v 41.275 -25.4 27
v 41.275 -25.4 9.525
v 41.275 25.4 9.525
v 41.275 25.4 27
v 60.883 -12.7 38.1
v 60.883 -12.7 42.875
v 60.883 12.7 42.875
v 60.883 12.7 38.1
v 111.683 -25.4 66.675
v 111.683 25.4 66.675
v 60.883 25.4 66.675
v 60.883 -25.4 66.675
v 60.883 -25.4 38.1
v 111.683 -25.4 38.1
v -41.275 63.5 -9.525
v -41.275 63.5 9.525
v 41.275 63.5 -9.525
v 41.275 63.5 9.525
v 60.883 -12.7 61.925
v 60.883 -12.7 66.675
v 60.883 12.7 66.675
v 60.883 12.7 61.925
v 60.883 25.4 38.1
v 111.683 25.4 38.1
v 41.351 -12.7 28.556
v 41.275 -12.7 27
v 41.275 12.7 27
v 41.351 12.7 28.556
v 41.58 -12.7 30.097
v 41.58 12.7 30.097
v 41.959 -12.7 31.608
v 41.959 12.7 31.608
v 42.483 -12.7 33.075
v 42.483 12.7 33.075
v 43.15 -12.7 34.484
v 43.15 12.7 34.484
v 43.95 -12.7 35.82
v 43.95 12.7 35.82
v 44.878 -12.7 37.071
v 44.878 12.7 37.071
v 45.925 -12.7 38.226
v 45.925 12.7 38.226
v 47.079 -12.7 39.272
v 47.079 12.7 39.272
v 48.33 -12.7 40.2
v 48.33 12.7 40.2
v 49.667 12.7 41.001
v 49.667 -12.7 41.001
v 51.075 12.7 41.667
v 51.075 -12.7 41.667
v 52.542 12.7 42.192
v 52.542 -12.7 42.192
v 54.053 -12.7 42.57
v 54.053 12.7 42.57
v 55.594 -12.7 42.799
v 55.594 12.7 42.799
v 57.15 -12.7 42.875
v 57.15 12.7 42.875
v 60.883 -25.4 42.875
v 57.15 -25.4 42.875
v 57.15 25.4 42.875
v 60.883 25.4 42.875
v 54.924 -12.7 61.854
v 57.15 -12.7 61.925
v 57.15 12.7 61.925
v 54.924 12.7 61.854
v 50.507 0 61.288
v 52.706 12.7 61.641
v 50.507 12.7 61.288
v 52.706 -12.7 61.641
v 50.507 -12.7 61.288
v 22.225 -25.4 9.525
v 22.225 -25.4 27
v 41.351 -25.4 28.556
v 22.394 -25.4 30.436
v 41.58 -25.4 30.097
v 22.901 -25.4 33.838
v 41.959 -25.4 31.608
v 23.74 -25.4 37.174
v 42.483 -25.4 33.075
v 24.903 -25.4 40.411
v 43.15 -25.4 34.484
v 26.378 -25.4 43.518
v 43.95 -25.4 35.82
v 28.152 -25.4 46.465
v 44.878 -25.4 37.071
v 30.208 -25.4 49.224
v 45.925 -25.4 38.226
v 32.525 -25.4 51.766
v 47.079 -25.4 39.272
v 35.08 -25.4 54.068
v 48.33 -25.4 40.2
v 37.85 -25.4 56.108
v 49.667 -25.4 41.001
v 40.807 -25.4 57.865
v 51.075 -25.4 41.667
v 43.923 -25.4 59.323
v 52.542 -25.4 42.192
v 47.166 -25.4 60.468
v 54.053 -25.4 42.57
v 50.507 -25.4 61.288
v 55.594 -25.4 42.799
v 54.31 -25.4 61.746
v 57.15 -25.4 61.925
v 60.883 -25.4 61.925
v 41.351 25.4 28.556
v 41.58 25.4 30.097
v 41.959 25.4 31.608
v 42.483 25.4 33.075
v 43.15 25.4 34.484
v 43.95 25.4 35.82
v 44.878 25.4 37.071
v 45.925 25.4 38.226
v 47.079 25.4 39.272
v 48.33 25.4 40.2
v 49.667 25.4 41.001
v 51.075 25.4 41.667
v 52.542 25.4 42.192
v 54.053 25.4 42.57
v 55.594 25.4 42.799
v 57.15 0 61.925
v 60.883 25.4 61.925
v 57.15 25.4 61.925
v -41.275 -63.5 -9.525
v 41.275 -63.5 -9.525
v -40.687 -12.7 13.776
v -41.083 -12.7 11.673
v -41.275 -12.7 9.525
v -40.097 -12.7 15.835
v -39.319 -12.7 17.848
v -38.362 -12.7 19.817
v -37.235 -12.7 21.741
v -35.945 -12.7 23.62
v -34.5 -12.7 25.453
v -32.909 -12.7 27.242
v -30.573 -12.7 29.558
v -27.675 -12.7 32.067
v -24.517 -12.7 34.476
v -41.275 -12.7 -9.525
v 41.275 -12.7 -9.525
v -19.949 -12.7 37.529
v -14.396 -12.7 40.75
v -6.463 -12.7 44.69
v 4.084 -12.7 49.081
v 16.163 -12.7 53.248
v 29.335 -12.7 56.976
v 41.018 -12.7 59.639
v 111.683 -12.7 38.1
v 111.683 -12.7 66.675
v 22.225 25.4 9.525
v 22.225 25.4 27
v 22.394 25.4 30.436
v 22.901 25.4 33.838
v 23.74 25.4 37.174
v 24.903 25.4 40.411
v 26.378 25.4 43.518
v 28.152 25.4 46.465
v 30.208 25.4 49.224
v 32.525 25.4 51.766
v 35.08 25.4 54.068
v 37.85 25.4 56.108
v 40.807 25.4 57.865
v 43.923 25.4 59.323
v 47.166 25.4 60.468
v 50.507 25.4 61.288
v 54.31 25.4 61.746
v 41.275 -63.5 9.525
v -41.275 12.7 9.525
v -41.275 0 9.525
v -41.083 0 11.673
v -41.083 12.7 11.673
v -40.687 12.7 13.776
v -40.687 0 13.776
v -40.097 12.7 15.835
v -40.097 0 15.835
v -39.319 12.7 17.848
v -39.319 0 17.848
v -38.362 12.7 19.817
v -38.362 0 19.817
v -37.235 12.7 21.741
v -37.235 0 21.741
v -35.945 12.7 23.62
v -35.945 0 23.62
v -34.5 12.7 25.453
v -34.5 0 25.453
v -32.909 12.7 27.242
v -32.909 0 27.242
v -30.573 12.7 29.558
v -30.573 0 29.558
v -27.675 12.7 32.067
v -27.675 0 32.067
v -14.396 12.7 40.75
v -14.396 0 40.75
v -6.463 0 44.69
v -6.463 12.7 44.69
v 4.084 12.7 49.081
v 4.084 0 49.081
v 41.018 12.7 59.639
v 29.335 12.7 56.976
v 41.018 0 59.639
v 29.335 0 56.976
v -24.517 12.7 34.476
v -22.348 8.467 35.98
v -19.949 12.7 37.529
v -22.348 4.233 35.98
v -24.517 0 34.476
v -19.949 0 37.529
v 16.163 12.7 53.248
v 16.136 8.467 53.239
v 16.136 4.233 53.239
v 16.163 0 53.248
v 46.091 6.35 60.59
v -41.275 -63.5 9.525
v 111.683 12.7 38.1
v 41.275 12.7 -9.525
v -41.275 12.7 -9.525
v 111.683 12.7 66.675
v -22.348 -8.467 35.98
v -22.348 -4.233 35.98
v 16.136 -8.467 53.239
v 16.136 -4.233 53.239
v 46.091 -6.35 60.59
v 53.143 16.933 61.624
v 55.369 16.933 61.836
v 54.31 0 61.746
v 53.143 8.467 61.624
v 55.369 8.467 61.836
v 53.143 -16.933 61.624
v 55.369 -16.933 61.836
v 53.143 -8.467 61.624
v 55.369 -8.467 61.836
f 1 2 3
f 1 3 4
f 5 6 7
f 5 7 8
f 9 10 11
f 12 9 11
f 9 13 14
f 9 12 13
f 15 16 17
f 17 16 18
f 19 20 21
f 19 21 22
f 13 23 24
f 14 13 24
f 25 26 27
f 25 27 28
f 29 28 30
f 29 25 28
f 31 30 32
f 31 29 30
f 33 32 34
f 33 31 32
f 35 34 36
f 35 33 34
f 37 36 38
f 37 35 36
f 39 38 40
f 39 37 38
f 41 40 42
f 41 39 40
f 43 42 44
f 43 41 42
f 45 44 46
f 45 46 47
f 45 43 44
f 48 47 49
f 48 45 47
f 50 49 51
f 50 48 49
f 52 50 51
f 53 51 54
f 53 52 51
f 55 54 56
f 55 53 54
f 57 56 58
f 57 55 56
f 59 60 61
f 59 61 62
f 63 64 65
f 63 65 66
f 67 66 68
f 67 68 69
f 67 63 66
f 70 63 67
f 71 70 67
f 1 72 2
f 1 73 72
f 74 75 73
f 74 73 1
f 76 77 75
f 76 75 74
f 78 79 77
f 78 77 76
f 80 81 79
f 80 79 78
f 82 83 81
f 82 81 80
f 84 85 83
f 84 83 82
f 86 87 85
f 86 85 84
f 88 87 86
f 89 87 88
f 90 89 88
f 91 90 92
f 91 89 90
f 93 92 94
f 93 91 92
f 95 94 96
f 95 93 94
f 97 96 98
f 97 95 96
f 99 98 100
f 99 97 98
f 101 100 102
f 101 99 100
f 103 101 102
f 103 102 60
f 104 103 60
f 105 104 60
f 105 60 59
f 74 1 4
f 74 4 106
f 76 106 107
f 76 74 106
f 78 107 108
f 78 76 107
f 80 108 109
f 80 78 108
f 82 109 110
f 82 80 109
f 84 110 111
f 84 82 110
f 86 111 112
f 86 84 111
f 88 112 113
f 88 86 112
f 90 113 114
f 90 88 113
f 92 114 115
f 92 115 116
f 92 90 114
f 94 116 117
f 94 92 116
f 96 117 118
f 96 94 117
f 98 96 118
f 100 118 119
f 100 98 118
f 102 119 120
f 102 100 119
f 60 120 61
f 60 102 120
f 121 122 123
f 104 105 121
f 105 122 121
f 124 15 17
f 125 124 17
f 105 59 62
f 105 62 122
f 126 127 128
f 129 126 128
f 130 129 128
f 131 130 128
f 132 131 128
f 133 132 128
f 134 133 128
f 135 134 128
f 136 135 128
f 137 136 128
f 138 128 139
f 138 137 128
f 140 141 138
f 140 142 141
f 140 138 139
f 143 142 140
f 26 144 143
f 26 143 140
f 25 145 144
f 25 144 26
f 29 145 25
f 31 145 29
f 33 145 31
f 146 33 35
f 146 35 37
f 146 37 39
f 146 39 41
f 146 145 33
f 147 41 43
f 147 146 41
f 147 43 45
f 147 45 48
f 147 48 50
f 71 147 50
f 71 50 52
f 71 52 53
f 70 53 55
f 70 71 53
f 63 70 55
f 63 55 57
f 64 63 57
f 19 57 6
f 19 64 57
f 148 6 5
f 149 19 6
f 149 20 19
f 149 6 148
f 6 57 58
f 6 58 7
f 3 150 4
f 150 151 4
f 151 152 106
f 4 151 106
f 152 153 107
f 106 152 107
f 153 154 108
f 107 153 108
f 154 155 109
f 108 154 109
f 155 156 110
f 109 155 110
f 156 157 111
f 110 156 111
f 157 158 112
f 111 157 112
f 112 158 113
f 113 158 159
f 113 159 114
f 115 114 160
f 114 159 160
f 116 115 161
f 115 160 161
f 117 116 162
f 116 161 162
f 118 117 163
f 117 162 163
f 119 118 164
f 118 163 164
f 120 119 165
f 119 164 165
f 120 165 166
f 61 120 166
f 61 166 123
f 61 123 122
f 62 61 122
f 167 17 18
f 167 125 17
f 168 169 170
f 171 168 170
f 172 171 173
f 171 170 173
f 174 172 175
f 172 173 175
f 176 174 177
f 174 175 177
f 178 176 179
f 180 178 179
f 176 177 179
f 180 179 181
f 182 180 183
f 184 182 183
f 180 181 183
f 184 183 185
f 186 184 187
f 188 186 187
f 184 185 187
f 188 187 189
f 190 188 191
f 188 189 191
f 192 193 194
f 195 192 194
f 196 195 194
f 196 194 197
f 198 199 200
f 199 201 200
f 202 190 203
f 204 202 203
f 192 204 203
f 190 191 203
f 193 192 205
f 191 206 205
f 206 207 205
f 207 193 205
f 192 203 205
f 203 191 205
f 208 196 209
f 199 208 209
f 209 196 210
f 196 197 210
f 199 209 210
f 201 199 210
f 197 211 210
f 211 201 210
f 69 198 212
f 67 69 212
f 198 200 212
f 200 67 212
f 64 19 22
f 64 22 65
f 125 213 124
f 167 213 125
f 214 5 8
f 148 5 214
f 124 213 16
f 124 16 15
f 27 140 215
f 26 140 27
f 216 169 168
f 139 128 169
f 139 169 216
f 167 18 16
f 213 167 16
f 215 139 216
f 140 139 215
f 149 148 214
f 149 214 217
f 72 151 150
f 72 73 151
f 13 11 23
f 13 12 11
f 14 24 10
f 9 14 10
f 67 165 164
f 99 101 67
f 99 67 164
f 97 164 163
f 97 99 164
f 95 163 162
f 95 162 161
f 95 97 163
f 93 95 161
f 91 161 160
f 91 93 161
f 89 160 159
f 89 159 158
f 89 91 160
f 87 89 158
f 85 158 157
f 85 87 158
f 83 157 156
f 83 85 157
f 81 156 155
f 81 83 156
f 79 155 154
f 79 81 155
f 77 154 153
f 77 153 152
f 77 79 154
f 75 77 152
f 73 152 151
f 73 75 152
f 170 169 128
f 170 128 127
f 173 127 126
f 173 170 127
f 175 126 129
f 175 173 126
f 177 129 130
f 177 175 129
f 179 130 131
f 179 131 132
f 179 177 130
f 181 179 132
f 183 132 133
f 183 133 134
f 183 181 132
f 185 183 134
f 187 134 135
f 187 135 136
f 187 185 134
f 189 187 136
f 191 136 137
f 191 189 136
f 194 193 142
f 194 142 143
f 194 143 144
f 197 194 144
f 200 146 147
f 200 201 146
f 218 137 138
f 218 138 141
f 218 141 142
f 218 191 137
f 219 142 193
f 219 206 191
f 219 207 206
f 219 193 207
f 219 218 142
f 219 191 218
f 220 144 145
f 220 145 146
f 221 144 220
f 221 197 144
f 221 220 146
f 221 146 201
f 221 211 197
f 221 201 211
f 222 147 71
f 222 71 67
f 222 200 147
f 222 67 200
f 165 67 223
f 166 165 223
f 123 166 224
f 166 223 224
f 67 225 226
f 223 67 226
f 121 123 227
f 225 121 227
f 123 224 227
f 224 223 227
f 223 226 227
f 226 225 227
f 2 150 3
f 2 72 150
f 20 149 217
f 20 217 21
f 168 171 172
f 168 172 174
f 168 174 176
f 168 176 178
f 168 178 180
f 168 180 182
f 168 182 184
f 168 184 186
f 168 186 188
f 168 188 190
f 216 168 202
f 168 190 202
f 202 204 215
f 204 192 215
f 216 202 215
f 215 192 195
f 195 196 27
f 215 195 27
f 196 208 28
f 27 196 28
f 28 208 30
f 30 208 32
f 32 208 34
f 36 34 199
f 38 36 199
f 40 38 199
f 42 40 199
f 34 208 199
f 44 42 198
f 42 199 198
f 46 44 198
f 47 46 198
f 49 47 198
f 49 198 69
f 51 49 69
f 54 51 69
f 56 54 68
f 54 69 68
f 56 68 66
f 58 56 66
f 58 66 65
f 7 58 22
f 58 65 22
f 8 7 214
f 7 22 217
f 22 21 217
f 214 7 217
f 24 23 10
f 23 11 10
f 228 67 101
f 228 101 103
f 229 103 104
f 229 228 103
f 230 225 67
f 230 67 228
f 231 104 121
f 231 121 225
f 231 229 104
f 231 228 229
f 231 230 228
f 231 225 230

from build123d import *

# Parameters (mm, degrees)
F1_DEPTH = 63.5
F2_DEPTH = 25.4
F3_DEPTH = 12.7
F4_DEPTH = 25.4


with BuildPart() as f1:
    # F0 (on Front) → F1 (new body, symmetric)
    with BuildSketch(Plane.XZ):
        Polygon((41.275, -9.525), (41.275, 9.525), (22.225, 9.525), (-41.275, 9.525), (-41.275, -9.525), align=None)
    extrude(amount=F1_DEPTH, both=True)


with BuildPart() as f2:
    # F0 (on Front) → F2 (new body, symmetric)
    with BuildSketch(Plane.XZ):
        Polygon((60.883363, 61.9252), (60.883363, 42.8752), (60.883363, 38.1), (111.683363, 38.1), (111.683363, 66.675), (60.883363, 66.675), align=None)
    extrude(amount=F2_DEPTH, both=True)


with BuildPart() as f3:
    # F0 (on Front) → F3 (new body, symmetric)
    with BuildSketch(Plane.XZ):
        Polygon((41.275, -9.525), (41.275, 9.525), (22.225, 9.525), (-41.275, 9.525), (-41.275, -9.525), align=None)
        with BuildLine():
            Line((22.225, 9.525), (41.275, 9.525))
            Line((41.275, 9.525), (41.275, 27.0002))
            ThreePointArc((41.275, 27.0002), (45.92468, 38.22552), (57.15, 42.8752))
            Line((57.15, 42.8752), (60.883363, 42.8752))
            Line((60.883363, 42.8752), (60.883363, 61.9252))
            Line((60.883363, 61.9252), (57.15, 61.9252))
            add(Edge.make_bspline(
                [(50.507101, 61.287625), (53.335145, 61.685698), (55.604551, 61.898257), (57.15, 61.9252)],
                knots=[99.933925, 99.933925, 99.933925, 99.933925, 111.504536, 111.504536, 111.504536, 111.504536], degree=3))
            ThreePointArc((50.507101, 61.287625), (30.20785, 49.223525), (22.225, 27.0002))
            Line((22.225, 27.0002), (22.225, 9.525))
        make_face()
        with BuildLine():
            Line((-41.275, 9.525), (22.225, 9.525))
            Line((22.225, 9.525), (22.225, 27.0002))
            ThreePointArc((22.225, 27.0002), (30.20785, 49.223525), (50.507101, 61.287625))
            add(Edge.make_bspline(
                [(-41.275, 9.525), (-40.015769, 40.572965), (26.08164, 57.849522), (50.507101, 61.287625)],
                knots=[0, 0, 0, 0, 99.933925, 99.933925, 99.933925, 99.933925], degree=3))
        make_face()
        with BuildLine():
            ThreePointArc((57.15, 61.9252), (53.813287, 61.765441), (50.507101, 61.287625))
            add(Edge.make_bspline(
                [(50.507101, 61.287625), (53.335145, 61.685698), (55.604551, 61.898257), (57.15, 61.9252)],
                knots=[99.933925, 99.933925, 99.933925, 99.933925, 111.504536, 111.504536, 111.504536, 111.504536], degree=3))
        make_face()
        Polygon((60.883363, 61.9252), (60.883363, 42.8752), (60.883363, 38.1), (111.683363, 38.1), (111.683363, 66.675), (60.883363, 66.675), align=None)
    extrude(amount=F3_DEPTH, both=True)


with BuildPart() as f4:
    # F0 (on Front) → F4 (new body, symmetric)
    with BuildSketch(Plane.XZ):
        with BuildLine():
            Line((22.225, 9.525), (41.275, 9.525))
            Line((41.275, 9.525), (41.275, 27.0002))
            ThreePointArc((41.275, 27.0002), (45.92468, 38.22552), (57.15, 42.8752))
            Line((57.15, 42.8752), (60.883363, 42.8752))
            Line((60.883363, 42.8752), (60.883363, 61.9252))
            Line((60.883363, 61.9252), (57.15, 61.9252))
            add(Edge.make_bspline(
                [(50.507101, 61.287625), (53.335145, 61.685698), (55.604551, 61.898257), (57.15, 61.9252)],
                knots=[99.933925, 99.933925, 99.933925, 99.933925, 111.504536, 111.504536, 111.504536, 111.504536], degree=3))
            ThreePointArc((50.507101, 61.287625), (30.20785, 49.223525), (22.225, 27.0002))
            Line((22.225, 27.0002), (22.225, 9.525))
        make_face()
    extrude(amount=F4_DEPTH, both=True)


solid = Compound([f1.part, f2.part, f3.part, f4.part])
